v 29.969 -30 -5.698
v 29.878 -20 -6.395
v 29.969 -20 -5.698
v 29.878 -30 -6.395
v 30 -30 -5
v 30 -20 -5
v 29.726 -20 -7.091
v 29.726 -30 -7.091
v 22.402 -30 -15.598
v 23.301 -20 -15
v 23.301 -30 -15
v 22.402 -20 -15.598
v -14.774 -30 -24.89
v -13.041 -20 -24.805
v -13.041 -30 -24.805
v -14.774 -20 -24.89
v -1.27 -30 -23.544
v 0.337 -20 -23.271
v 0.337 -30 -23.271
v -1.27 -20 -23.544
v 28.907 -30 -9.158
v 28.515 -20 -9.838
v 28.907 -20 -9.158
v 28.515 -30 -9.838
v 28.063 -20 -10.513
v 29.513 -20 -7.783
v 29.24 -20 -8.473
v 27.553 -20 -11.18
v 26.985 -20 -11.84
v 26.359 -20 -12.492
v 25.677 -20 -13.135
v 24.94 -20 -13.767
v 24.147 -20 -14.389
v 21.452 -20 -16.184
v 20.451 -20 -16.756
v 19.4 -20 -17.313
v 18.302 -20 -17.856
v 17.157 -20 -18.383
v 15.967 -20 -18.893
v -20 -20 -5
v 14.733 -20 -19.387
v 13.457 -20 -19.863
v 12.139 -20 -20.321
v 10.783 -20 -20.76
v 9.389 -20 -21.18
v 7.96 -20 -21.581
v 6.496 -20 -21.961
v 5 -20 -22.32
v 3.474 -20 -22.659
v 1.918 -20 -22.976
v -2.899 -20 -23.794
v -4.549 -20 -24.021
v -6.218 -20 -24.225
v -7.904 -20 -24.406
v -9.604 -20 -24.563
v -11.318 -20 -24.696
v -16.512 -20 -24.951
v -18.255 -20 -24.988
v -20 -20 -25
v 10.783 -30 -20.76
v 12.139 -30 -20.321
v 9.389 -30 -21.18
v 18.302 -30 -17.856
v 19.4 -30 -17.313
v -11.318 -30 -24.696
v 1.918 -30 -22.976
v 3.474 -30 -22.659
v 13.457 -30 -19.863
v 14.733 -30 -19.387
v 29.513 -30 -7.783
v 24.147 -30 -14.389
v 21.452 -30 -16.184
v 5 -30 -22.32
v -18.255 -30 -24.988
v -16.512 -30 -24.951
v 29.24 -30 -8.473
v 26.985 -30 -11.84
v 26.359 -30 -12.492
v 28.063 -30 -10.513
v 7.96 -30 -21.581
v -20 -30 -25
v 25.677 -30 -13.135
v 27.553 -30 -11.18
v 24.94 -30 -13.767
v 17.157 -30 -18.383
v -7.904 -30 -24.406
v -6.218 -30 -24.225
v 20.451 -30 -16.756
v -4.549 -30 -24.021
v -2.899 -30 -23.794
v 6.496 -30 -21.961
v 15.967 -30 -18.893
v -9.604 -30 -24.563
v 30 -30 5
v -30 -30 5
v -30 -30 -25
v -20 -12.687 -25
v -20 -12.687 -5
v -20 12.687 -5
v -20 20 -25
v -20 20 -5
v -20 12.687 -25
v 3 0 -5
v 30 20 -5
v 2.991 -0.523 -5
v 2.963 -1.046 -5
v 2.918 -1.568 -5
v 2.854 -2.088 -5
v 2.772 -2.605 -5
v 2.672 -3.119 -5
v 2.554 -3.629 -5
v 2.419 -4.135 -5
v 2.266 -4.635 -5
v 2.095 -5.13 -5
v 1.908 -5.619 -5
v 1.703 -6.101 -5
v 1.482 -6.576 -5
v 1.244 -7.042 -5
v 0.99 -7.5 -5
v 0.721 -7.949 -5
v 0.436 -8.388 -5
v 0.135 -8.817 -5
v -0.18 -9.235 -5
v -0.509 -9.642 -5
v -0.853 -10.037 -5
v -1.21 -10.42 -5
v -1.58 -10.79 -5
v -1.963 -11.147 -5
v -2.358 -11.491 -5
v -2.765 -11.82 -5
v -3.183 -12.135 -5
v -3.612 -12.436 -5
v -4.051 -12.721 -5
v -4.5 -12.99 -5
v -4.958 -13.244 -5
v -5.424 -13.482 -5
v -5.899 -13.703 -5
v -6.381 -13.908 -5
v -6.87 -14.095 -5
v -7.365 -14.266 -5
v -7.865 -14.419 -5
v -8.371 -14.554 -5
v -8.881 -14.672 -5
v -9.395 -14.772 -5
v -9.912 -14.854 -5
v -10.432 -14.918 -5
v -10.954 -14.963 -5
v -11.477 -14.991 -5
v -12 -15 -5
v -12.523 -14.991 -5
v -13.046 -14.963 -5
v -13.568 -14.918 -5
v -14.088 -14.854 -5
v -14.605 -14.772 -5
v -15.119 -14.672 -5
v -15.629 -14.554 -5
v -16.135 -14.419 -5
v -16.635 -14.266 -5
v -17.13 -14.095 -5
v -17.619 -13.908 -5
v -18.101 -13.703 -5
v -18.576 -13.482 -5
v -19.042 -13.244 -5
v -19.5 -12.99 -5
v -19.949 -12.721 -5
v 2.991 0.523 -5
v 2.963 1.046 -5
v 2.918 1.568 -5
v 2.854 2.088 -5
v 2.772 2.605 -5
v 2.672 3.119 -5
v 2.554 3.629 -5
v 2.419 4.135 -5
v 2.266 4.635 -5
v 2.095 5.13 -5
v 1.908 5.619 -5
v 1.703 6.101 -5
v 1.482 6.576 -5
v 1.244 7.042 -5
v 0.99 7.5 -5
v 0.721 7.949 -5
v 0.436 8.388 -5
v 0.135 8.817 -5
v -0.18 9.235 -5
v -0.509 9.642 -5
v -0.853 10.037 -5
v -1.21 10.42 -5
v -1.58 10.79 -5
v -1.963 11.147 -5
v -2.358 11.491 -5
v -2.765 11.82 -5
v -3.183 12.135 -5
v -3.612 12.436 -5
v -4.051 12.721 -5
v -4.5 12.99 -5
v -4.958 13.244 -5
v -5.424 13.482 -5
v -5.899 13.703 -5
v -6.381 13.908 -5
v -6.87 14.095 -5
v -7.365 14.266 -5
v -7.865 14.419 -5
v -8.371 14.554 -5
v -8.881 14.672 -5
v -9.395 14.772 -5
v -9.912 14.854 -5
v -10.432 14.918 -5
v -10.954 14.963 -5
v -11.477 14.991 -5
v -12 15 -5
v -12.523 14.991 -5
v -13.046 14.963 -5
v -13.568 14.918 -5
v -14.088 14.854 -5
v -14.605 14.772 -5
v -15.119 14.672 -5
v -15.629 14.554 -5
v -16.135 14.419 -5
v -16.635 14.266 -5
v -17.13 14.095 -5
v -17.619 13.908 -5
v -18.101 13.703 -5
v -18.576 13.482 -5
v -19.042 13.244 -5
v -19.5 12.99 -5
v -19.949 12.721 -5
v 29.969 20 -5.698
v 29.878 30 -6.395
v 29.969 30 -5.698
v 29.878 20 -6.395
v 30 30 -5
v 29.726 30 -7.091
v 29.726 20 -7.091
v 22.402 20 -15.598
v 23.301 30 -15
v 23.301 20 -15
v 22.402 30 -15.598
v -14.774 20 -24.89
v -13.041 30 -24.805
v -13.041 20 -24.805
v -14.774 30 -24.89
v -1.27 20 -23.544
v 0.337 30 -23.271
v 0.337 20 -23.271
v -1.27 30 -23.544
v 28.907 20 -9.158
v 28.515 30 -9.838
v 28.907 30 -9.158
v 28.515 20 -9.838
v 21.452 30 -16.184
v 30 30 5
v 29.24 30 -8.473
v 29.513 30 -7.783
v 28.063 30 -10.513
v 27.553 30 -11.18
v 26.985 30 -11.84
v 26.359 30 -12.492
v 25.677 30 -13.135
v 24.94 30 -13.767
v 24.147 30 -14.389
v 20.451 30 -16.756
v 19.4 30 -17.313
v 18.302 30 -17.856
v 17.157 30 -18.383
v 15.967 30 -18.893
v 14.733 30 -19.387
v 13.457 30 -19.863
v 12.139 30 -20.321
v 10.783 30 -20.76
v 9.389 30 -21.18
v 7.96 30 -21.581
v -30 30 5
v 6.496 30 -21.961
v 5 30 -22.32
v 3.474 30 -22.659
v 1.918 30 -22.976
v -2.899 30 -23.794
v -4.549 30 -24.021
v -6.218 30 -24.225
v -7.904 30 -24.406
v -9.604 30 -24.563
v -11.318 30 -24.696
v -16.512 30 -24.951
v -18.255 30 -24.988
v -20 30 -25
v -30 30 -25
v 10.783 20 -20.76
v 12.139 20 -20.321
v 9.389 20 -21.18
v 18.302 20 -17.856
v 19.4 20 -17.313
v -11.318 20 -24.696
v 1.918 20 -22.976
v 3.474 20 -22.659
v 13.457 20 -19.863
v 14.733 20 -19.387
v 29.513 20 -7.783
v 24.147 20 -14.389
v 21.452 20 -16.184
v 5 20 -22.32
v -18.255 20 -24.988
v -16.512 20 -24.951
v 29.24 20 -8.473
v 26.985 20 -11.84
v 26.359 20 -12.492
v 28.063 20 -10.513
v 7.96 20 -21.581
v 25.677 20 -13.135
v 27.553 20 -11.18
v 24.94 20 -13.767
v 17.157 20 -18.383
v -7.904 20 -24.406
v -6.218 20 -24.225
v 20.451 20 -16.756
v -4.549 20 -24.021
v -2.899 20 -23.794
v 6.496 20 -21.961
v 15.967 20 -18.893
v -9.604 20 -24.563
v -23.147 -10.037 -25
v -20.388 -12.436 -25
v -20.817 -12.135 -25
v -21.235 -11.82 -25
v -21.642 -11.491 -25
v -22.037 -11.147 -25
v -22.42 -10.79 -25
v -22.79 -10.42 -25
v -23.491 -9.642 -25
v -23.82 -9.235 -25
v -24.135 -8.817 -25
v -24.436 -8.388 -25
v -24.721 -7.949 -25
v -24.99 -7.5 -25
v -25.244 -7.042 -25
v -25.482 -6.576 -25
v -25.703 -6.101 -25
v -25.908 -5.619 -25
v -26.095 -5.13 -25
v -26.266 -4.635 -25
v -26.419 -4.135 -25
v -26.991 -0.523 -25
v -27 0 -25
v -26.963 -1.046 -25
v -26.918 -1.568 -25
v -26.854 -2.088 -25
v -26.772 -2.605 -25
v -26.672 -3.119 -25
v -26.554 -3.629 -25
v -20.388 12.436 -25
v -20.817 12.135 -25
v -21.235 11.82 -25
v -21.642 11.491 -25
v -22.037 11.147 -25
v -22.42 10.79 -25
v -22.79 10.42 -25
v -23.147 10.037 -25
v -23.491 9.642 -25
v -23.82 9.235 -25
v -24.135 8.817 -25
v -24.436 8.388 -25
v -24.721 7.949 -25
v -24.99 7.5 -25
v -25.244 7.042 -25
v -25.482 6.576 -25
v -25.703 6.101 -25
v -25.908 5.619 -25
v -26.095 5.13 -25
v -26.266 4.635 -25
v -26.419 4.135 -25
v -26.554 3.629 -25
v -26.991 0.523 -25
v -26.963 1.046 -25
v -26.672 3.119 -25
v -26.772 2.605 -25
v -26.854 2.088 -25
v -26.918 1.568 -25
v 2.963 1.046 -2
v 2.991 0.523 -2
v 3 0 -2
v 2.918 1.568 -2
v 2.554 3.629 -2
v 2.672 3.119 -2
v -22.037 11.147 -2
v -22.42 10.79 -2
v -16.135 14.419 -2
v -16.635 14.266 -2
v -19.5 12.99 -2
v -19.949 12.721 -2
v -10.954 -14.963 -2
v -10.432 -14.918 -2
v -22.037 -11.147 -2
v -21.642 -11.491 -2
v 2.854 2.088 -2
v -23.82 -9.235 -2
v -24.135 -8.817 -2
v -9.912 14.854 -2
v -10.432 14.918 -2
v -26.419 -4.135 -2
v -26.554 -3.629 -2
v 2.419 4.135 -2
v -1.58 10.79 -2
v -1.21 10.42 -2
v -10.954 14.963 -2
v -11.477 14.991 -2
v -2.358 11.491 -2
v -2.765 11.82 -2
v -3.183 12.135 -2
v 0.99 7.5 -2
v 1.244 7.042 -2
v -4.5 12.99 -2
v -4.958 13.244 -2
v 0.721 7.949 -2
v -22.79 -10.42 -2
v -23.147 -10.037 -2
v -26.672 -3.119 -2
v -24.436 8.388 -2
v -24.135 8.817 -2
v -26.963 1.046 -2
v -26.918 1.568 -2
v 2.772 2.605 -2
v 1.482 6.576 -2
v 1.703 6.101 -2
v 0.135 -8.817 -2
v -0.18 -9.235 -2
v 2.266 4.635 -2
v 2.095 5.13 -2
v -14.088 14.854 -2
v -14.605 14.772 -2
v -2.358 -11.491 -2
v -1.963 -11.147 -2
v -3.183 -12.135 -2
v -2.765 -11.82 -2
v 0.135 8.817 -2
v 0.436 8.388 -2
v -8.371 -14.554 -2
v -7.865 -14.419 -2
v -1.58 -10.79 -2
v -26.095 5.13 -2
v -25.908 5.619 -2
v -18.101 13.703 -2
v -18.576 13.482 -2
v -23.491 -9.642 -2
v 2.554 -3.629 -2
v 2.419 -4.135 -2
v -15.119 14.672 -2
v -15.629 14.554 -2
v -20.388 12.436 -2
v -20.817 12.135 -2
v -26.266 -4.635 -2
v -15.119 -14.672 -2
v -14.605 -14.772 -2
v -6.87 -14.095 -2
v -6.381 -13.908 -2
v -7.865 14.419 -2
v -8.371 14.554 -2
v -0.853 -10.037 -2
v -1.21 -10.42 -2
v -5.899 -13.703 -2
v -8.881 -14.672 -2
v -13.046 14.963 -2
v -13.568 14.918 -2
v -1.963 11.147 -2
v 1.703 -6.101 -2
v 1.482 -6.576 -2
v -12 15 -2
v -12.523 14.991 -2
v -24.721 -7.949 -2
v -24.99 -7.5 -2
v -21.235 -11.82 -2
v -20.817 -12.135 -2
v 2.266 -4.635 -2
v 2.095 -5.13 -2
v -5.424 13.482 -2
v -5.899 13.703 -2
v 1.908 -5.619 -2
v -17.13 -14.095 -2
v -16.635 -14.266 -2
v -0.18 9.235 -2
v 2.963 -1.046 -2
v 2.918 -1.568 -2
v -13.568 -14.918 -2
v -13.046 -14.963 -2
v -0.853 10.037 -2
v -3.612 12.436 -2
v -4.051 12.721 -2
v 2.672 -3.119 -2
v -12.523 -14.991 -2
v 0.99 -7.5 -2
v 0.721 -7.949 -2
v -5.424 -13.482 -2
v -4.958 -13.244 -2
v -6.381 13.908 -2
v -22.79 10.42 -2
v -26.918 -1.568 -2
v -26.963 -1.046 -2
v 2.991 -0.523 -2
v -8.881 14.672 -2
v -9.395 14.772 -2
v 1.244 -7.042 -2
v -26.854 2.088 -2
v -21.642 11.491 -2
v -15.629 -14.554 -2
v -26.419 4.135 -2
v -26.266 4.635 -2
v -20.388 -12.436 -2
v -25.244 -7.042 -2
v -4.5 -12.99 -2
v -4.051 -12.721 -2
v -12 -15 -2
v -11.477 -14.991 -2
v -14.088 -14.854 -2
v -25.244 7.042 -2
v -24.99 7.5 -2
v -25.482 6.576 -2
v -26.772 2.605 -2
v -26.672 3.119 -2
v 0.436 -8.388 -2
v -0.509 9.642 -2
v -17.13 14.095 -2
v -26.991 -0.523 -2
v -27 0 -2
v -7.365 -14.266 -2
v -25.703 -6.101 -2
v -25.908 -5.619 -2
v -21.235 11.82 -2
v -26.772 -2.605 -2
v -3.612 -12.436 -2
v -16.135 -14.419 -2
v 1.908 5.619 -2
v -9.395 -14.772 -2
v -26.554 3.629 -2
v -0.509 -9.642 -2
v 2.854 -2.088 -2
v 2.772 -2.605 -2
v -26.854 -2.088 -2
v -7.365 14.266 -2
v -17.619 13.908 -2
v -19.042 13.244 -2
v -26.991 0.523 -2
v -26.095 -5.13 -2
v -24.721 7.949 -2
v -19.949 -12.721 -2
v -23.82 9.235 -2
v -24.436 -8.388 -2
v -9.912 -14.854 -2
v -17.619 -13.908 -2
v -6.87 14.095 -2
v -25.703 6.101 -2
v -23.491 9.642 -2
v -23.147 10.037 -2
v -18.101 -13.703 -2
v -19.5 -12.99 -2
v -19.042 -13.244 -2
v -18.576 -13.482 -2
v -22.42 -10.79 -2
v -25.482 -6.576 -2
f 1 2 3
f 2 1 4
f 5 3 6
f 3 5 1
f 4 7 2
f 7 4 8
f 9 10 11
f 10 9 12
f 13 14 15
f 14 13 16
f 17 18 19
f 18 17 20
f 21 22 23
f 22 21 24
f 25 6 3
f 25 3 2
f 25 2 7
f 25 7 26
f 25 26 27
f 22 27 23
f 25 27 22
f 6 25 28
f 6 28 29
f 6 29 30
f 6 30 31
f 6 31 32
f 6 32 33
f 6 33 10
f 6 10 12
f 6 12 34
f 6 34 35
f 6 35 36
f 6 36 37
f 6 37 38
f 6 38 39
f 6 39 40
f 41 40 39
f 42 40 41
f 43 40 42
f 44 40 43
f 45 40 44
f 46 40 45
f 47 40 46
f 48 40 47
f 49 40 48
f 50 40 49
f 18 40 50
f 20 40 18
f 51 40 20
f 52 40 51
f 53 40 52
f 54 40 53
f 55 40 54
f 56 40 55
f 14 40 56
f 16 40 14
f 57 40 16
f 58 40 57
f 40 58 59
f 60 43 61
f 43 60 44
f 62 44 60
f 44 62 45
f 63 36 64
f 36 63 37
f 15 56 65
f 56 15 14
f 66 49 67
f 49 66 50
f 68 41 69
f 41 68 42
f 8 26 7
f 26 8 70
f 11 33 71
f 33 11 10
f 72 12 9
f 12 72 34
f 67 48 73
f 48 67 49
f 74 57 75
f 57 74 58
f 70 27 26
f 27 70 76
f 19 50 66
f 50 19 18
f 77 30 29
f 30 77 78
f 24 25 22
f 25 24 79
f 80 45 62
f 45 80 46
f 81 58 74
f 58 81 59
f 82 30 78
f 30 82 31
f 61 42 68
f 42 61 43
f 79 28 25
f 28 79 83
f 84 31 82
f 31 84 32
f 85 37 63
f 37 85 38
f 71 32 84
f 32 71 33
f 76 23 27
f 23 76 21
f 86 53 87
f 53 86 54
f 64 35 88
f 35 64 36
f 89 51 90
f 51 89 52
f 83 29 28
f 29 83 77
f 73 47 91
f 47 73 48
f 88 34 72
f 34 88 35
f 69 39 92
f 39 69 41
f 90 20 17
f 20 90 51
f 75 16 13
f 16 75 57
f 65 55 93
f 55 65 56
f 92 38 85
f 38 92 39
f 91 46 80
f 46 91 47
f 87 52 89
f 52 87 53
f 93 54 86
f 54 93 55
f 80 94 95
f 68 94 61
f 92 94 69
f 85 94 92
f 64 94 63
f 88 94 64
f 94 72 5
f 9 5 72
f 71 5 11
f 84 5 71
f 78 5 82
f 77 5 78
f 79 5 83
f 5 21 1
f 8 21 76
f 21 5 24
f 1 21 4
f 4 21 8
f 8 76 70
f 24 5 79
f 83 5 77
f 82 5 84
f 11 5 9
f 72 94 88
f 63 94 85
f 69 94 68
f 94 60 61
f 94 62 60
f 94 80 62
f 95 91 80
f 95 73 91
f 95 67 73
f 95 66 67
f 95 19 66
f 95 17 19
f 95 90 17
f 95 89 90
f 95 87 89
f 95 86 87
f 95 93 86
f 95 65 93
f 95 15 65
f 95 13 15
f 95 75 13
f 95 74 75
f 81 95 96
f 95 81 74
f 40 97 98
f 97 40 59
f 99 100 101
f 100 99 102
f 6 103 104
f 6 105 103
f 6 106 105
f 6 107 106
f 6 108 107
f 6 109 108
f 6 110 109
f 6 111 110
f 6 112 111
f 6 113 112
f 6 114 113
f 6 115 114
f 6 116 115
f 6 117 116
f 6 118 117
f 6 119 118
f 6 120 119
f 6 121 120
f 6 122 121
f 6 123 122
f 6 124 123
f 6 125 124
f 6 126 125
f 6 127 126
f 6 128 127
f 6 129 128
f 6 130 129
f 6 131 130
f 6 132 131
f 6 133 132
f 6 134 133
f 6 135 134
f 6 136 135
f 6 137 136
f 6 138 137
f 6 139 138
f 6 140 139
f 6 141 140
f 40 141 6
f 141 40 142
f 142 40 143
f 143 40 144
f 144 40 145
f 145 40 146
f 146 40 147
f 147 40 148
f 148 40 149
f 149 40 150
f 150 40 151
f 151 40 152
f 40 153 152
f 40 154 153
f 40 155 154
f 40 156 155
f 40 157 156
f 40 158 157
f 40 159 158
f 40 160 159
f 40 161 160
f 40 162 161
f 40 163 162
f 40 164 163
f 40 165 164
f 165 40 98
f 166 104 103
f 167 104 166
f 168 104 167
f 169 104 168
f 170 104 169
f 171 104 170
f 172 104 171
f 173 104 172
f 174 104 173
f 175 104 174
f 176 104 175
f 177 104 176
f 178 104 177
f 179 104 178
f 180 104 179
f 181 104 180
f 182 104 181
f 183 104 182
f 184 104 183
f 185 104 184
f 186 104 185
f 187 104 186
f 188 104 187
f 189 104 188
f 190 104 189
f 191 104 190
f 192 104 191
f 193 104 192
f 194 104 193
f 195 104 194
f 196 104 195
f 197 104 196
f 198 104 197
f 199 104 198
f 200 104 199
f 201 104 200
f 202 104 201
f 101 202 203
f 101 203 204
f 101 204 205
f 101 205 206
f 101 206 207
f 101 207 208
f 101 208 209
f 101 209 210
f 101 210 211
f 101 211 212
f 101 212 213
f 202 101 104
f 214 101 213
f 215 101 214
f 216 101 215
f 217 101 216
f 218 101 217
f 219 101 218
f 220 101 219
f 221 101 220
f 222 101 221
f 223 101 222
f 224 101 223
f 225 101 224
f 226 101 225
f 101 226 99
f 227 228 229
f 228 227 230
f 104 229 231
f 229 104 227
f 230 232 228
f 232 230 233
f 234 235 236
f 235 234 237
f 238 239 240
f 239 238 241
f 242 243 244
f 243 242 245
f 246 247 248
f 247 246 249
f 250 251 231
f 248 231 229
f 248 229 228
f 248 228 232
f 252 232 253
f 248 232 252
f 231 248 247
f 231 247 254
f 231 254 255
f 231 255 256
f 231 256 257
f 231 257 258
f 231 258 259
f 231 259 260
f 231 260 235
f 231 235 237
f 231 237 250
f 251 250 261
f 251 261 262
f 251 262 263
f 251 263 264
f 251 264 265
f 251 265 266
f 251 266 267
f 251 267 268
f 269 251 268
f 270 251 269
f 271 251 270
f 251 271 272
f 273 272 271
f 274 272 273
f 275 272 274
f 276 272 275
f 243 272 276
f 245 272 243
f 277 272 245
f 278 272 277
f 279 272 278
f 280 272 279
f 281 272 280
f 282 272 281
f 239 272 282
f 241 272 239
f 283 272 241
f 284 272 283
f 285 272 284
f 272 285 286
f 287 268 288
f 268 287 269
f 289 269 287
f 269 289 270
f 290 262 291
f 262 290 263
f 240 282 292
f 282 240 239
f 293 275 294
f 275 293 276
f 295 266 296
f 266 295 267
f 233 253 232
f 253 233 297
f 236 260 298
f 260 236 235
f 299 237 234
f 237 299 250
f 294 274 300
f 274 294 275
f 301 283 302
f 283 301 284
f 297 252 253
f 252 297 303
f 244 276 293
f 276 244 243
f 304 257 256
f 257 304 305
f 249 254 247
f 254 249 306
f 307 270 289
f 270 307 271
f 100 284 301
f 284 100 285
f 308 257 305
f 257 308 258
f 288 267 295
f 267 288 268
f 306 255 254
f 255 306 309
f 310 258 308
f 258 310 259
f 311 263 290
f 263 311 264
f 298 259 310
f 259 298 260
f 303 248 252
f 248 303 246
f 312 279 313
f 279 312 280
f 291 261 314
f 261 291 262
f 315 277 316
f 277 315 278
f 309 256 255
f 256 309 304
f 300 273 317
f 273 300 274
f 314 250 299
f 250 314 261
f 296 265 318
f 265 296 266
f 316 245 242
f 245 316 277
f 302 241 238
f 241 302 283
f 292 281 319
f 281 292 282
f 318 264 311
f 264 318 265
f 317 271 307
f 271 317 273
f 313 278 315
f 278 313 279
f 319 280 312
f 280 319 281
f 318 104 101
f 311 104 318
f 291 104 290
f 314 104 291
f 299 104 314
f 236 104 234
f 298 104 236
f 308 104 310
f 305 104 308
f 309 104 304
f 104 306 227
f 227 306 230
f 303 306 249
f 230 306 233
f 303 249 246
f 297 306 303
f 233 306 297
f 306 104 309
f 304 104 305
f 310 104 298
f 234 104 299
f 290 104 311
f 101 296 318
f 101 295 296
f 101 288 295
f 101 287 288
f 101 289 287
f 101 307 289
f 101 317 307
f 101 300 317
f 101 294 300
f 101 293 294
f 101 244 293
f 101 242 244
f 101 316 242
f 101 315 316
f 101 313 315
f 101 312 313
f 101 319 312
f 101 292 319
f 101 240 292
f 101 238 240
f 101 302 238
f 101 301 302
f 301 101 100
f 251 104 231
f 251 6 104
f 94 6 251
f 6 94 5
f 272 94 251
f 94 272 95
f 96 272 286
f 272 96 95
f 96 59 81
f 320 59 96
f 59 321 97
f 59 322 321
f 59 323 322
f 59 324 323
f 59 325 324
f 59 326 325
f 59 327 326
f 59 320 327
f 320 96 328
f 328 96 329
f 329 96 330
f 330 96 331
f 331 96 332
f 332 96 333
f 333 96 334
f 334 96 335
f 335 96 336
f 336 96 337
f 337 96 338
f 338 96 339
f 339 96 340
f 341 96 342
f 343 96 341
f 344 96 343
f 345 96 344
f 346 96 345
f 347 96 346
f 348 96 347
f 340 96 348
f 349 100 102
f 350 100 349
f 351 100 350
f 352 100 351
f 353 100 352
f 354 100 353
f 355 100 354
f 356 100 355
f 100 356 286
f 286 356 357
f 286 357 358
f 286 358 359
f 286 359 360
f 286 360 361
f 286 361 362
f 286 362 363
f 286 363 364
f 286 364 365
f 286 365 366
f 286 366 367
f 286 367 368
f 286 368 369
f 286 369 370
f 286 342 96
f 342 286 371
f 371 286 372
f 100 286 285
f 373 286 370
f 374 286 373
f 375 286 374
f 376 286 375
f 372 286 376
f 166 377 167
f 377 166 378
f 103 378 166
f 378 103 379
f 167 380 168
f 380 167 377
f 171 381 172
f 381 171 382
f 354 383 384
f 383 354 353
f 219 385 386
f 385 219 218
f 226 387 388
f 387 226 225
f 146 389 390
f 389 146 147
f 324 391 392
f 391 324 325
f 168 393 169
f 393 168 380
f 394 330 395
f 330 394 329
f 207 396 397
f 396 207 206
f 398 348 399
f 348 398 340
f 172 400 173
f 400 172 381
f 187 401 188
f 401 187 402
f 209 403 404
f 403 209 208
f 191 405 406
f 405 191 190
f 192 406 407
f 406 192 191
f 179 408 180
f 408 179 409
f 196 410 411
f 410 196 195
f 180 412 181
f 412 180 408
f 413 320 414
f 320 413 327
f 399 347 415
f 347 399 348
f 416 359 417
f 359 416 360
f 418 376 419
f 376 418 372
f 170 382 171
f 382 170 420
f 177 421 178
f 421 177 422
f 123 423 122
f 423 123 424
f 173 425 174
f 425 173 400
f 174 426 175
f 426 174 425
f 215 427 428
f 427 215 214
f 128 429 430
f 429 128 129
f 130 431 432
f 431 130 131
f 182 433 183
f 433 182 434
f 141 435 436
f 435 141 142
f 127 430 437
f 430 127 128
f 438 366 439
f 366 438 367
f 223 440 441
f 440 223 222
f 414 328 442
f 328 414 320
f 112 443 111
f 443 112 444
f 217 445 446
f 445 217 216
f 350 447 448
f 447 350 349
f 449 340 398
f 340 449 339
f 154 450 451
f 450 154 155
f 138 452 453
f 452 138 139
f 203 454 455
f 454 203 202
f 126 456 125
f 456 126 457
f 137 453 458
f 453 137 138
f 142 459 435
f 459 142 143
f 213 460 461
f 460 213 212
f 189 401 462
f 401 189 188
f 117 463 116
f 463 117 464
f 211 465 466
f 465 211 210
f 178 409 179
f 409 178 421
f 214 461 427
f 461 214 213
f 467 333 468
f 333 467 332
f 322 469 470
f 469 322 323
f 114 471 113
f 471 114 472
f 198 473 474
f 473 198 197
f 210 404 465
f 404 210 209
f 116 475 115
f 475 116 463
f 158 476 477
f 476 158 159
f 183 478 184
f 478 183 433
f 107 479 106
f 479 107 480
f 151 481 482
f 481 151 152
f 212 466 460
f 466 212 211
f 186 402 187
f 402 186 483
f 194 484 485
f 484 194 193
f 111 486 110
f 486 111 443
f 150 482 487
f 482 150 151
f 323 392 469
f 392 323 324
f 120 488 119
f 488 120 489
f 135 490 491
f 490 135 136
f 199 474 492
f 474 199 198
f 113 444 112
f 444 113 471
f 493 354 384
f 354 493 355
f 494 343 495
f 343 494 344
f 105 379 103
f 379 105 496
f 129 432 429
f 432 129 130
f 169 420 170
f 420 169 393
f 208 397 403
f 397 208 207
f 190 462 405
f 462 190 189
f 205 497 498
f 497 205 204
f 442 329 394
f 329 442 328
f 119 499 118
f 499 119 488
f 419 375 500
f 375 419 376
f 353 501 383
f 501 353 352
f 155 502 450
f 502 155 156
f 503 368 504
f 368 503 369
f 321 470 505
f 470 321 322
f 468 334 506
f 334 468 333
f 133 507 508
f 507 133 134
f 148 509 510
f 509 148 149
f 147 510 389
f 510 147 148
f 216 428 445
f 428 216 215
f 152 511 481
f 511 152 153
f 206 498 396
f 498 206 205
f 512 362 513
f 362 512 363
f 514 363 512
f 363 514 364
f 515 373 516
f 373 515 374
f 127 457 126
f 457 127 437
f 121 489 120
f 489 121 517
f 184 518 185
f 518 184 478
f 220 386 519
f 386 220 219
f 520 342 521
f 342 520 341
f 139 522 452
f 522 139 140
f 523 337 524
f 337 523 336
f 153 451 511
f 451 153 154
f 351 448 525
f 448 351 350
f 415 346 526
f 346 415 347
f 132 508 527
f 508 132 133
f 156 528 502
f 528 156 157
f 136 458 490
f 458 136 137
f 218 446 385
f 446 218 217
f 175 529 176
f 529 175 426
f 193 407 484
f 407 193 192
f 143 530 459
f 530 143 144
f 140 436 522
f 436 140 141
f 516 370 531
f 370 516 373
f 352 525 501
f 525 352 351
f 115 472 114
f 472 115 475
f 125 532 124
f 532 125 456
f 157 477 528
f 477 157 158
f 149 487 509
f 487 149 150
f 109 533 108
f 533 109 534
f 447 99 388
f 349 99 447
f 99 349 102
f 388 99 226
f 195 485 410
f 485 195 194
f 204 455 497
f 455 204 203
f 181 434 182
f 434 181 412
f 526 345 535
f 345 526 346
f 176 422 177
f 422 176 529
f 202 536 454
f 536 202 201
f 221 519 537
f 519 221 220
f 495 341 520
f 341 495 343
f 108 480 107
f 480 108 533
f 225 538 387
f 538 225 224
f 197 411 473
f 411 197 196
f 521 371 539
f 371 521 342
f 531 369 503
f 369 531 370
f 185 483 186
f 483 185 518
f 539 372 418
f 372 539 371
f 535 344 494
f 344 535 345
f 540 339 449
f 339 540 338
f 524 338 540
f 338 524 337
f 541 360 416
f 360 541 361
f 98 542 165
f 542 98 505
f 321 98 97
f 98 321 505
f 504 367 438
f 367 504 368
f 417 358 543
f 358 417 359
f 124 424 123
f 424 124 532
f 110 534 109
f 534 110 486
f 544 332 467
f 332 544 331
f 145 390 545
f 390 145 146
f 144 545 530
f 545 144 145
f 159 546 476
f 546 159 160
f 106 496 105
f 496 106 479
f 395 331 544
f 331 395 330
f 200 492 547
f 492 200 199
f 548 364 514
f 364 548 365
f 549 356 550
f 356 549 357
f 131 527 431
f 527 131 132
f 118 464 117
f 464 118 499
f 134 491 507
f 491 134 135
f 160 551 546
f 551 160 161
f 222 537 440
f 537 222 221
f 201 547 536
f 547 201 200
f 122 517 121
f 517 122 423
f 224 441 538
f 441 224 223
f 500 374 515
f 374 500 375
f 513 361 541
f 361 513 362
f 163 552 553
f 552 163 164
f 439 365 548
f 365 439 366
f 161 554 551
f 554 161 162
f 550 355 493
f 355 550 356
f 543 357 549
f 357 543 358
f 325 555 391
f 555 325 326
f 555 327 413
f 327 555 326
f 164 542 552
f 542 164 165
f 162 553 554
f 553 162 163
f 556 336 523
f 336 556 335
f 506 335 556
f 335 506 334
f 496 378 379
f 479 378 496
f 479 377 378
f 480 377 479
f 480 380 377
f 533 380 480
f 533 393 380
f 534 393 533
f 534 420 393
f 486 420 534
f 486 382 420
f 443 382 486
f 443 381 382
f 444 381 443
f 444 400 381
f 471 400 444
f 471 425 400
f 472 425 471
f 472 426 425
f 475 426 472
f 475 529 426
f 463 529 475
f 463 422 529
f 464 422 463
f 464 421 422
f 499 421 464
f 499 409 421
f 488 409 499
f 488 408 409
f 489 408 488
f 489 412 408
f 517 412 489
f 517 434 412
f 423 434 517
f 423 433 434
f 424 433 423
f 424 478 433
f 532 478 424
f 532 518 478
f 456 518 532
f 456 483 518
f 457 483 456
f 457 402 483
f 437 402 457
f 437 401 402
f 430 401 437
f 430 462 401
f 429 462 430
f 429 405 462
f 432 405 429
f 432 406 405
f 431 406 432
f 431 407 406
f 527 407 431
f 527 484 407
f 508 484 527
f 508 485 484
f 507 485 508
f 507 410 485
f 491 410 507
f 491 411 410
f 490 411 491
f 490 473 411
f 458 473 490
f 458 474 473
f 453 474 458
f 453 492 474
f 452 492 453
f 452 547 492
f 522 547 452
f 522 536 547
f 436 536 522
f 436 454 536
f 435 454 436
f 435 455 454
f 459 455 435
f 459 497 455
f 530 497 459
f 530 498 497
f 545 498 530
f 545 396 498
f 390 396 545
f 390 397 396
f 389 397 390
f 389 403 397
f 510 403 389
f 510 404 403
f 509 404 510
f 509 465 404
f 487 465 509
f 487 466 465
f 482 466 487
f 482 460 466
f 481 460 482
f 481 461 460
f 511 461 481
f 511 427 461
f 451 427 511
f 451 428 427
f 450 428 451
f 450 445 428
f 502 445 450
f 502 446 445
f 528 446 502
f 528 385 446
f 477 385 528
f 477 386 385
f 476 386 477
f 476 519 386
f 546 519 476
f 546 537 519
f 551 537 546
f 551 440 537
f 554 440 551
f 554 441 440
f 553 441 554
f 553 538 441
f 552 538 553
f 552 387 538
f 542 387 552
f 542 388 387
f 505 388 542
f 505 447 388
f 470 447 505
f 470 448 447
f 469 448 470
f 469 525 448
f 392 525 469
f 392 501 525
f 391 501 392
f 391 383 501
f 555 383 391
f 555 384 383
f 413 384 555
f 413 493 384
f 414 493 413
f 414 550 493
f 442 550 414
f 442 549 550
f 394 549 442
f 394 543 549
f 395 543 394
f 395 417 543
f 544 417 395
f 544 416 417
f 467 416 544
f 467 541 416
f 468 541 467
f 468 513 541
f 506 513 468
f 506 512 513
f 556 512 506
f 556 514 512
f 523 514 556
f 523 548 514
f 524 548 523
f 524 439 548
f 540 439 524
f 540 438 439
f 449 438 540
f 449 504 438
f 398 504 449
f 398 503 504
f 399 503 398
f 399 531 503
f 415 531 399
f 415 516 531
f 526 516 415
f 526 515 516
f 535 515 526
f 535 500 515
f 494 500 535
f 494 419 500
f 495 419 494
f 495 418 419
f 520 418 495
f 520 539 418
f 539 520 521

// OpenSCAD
$fn = 180;

width = 60;
depth = 60;
height = 30;
thickness = 10;

difference(){
	union(){
		cube([depth, width, thickness], center=true);
		
		translate([-25, 0, -height/2+thickness/2])
			cube([thickness, width, height], center=true);
		
		yAbs = width/2-thickness/2;
		for(y = [-yAbs, yAbs]){
			translate([-depth/2+thickness, y, -thickness/2])
				//cube([depth, thickness, height], center=true);
				side();
			}
	}
	
	translate([-12, 0, -height-5+3])
		#cylinder(d=30, h=height);
}


module side(){
	resize([depth-thickness, thickness, height-thickness]){
		rotate([-90, 0, 0]){
			translate([0, 0, -0.5]){
				intersection(){
					cylinder(d=1, h=1);
					cube([1, 1, 1]);
				}
			}
		}
	}
}
